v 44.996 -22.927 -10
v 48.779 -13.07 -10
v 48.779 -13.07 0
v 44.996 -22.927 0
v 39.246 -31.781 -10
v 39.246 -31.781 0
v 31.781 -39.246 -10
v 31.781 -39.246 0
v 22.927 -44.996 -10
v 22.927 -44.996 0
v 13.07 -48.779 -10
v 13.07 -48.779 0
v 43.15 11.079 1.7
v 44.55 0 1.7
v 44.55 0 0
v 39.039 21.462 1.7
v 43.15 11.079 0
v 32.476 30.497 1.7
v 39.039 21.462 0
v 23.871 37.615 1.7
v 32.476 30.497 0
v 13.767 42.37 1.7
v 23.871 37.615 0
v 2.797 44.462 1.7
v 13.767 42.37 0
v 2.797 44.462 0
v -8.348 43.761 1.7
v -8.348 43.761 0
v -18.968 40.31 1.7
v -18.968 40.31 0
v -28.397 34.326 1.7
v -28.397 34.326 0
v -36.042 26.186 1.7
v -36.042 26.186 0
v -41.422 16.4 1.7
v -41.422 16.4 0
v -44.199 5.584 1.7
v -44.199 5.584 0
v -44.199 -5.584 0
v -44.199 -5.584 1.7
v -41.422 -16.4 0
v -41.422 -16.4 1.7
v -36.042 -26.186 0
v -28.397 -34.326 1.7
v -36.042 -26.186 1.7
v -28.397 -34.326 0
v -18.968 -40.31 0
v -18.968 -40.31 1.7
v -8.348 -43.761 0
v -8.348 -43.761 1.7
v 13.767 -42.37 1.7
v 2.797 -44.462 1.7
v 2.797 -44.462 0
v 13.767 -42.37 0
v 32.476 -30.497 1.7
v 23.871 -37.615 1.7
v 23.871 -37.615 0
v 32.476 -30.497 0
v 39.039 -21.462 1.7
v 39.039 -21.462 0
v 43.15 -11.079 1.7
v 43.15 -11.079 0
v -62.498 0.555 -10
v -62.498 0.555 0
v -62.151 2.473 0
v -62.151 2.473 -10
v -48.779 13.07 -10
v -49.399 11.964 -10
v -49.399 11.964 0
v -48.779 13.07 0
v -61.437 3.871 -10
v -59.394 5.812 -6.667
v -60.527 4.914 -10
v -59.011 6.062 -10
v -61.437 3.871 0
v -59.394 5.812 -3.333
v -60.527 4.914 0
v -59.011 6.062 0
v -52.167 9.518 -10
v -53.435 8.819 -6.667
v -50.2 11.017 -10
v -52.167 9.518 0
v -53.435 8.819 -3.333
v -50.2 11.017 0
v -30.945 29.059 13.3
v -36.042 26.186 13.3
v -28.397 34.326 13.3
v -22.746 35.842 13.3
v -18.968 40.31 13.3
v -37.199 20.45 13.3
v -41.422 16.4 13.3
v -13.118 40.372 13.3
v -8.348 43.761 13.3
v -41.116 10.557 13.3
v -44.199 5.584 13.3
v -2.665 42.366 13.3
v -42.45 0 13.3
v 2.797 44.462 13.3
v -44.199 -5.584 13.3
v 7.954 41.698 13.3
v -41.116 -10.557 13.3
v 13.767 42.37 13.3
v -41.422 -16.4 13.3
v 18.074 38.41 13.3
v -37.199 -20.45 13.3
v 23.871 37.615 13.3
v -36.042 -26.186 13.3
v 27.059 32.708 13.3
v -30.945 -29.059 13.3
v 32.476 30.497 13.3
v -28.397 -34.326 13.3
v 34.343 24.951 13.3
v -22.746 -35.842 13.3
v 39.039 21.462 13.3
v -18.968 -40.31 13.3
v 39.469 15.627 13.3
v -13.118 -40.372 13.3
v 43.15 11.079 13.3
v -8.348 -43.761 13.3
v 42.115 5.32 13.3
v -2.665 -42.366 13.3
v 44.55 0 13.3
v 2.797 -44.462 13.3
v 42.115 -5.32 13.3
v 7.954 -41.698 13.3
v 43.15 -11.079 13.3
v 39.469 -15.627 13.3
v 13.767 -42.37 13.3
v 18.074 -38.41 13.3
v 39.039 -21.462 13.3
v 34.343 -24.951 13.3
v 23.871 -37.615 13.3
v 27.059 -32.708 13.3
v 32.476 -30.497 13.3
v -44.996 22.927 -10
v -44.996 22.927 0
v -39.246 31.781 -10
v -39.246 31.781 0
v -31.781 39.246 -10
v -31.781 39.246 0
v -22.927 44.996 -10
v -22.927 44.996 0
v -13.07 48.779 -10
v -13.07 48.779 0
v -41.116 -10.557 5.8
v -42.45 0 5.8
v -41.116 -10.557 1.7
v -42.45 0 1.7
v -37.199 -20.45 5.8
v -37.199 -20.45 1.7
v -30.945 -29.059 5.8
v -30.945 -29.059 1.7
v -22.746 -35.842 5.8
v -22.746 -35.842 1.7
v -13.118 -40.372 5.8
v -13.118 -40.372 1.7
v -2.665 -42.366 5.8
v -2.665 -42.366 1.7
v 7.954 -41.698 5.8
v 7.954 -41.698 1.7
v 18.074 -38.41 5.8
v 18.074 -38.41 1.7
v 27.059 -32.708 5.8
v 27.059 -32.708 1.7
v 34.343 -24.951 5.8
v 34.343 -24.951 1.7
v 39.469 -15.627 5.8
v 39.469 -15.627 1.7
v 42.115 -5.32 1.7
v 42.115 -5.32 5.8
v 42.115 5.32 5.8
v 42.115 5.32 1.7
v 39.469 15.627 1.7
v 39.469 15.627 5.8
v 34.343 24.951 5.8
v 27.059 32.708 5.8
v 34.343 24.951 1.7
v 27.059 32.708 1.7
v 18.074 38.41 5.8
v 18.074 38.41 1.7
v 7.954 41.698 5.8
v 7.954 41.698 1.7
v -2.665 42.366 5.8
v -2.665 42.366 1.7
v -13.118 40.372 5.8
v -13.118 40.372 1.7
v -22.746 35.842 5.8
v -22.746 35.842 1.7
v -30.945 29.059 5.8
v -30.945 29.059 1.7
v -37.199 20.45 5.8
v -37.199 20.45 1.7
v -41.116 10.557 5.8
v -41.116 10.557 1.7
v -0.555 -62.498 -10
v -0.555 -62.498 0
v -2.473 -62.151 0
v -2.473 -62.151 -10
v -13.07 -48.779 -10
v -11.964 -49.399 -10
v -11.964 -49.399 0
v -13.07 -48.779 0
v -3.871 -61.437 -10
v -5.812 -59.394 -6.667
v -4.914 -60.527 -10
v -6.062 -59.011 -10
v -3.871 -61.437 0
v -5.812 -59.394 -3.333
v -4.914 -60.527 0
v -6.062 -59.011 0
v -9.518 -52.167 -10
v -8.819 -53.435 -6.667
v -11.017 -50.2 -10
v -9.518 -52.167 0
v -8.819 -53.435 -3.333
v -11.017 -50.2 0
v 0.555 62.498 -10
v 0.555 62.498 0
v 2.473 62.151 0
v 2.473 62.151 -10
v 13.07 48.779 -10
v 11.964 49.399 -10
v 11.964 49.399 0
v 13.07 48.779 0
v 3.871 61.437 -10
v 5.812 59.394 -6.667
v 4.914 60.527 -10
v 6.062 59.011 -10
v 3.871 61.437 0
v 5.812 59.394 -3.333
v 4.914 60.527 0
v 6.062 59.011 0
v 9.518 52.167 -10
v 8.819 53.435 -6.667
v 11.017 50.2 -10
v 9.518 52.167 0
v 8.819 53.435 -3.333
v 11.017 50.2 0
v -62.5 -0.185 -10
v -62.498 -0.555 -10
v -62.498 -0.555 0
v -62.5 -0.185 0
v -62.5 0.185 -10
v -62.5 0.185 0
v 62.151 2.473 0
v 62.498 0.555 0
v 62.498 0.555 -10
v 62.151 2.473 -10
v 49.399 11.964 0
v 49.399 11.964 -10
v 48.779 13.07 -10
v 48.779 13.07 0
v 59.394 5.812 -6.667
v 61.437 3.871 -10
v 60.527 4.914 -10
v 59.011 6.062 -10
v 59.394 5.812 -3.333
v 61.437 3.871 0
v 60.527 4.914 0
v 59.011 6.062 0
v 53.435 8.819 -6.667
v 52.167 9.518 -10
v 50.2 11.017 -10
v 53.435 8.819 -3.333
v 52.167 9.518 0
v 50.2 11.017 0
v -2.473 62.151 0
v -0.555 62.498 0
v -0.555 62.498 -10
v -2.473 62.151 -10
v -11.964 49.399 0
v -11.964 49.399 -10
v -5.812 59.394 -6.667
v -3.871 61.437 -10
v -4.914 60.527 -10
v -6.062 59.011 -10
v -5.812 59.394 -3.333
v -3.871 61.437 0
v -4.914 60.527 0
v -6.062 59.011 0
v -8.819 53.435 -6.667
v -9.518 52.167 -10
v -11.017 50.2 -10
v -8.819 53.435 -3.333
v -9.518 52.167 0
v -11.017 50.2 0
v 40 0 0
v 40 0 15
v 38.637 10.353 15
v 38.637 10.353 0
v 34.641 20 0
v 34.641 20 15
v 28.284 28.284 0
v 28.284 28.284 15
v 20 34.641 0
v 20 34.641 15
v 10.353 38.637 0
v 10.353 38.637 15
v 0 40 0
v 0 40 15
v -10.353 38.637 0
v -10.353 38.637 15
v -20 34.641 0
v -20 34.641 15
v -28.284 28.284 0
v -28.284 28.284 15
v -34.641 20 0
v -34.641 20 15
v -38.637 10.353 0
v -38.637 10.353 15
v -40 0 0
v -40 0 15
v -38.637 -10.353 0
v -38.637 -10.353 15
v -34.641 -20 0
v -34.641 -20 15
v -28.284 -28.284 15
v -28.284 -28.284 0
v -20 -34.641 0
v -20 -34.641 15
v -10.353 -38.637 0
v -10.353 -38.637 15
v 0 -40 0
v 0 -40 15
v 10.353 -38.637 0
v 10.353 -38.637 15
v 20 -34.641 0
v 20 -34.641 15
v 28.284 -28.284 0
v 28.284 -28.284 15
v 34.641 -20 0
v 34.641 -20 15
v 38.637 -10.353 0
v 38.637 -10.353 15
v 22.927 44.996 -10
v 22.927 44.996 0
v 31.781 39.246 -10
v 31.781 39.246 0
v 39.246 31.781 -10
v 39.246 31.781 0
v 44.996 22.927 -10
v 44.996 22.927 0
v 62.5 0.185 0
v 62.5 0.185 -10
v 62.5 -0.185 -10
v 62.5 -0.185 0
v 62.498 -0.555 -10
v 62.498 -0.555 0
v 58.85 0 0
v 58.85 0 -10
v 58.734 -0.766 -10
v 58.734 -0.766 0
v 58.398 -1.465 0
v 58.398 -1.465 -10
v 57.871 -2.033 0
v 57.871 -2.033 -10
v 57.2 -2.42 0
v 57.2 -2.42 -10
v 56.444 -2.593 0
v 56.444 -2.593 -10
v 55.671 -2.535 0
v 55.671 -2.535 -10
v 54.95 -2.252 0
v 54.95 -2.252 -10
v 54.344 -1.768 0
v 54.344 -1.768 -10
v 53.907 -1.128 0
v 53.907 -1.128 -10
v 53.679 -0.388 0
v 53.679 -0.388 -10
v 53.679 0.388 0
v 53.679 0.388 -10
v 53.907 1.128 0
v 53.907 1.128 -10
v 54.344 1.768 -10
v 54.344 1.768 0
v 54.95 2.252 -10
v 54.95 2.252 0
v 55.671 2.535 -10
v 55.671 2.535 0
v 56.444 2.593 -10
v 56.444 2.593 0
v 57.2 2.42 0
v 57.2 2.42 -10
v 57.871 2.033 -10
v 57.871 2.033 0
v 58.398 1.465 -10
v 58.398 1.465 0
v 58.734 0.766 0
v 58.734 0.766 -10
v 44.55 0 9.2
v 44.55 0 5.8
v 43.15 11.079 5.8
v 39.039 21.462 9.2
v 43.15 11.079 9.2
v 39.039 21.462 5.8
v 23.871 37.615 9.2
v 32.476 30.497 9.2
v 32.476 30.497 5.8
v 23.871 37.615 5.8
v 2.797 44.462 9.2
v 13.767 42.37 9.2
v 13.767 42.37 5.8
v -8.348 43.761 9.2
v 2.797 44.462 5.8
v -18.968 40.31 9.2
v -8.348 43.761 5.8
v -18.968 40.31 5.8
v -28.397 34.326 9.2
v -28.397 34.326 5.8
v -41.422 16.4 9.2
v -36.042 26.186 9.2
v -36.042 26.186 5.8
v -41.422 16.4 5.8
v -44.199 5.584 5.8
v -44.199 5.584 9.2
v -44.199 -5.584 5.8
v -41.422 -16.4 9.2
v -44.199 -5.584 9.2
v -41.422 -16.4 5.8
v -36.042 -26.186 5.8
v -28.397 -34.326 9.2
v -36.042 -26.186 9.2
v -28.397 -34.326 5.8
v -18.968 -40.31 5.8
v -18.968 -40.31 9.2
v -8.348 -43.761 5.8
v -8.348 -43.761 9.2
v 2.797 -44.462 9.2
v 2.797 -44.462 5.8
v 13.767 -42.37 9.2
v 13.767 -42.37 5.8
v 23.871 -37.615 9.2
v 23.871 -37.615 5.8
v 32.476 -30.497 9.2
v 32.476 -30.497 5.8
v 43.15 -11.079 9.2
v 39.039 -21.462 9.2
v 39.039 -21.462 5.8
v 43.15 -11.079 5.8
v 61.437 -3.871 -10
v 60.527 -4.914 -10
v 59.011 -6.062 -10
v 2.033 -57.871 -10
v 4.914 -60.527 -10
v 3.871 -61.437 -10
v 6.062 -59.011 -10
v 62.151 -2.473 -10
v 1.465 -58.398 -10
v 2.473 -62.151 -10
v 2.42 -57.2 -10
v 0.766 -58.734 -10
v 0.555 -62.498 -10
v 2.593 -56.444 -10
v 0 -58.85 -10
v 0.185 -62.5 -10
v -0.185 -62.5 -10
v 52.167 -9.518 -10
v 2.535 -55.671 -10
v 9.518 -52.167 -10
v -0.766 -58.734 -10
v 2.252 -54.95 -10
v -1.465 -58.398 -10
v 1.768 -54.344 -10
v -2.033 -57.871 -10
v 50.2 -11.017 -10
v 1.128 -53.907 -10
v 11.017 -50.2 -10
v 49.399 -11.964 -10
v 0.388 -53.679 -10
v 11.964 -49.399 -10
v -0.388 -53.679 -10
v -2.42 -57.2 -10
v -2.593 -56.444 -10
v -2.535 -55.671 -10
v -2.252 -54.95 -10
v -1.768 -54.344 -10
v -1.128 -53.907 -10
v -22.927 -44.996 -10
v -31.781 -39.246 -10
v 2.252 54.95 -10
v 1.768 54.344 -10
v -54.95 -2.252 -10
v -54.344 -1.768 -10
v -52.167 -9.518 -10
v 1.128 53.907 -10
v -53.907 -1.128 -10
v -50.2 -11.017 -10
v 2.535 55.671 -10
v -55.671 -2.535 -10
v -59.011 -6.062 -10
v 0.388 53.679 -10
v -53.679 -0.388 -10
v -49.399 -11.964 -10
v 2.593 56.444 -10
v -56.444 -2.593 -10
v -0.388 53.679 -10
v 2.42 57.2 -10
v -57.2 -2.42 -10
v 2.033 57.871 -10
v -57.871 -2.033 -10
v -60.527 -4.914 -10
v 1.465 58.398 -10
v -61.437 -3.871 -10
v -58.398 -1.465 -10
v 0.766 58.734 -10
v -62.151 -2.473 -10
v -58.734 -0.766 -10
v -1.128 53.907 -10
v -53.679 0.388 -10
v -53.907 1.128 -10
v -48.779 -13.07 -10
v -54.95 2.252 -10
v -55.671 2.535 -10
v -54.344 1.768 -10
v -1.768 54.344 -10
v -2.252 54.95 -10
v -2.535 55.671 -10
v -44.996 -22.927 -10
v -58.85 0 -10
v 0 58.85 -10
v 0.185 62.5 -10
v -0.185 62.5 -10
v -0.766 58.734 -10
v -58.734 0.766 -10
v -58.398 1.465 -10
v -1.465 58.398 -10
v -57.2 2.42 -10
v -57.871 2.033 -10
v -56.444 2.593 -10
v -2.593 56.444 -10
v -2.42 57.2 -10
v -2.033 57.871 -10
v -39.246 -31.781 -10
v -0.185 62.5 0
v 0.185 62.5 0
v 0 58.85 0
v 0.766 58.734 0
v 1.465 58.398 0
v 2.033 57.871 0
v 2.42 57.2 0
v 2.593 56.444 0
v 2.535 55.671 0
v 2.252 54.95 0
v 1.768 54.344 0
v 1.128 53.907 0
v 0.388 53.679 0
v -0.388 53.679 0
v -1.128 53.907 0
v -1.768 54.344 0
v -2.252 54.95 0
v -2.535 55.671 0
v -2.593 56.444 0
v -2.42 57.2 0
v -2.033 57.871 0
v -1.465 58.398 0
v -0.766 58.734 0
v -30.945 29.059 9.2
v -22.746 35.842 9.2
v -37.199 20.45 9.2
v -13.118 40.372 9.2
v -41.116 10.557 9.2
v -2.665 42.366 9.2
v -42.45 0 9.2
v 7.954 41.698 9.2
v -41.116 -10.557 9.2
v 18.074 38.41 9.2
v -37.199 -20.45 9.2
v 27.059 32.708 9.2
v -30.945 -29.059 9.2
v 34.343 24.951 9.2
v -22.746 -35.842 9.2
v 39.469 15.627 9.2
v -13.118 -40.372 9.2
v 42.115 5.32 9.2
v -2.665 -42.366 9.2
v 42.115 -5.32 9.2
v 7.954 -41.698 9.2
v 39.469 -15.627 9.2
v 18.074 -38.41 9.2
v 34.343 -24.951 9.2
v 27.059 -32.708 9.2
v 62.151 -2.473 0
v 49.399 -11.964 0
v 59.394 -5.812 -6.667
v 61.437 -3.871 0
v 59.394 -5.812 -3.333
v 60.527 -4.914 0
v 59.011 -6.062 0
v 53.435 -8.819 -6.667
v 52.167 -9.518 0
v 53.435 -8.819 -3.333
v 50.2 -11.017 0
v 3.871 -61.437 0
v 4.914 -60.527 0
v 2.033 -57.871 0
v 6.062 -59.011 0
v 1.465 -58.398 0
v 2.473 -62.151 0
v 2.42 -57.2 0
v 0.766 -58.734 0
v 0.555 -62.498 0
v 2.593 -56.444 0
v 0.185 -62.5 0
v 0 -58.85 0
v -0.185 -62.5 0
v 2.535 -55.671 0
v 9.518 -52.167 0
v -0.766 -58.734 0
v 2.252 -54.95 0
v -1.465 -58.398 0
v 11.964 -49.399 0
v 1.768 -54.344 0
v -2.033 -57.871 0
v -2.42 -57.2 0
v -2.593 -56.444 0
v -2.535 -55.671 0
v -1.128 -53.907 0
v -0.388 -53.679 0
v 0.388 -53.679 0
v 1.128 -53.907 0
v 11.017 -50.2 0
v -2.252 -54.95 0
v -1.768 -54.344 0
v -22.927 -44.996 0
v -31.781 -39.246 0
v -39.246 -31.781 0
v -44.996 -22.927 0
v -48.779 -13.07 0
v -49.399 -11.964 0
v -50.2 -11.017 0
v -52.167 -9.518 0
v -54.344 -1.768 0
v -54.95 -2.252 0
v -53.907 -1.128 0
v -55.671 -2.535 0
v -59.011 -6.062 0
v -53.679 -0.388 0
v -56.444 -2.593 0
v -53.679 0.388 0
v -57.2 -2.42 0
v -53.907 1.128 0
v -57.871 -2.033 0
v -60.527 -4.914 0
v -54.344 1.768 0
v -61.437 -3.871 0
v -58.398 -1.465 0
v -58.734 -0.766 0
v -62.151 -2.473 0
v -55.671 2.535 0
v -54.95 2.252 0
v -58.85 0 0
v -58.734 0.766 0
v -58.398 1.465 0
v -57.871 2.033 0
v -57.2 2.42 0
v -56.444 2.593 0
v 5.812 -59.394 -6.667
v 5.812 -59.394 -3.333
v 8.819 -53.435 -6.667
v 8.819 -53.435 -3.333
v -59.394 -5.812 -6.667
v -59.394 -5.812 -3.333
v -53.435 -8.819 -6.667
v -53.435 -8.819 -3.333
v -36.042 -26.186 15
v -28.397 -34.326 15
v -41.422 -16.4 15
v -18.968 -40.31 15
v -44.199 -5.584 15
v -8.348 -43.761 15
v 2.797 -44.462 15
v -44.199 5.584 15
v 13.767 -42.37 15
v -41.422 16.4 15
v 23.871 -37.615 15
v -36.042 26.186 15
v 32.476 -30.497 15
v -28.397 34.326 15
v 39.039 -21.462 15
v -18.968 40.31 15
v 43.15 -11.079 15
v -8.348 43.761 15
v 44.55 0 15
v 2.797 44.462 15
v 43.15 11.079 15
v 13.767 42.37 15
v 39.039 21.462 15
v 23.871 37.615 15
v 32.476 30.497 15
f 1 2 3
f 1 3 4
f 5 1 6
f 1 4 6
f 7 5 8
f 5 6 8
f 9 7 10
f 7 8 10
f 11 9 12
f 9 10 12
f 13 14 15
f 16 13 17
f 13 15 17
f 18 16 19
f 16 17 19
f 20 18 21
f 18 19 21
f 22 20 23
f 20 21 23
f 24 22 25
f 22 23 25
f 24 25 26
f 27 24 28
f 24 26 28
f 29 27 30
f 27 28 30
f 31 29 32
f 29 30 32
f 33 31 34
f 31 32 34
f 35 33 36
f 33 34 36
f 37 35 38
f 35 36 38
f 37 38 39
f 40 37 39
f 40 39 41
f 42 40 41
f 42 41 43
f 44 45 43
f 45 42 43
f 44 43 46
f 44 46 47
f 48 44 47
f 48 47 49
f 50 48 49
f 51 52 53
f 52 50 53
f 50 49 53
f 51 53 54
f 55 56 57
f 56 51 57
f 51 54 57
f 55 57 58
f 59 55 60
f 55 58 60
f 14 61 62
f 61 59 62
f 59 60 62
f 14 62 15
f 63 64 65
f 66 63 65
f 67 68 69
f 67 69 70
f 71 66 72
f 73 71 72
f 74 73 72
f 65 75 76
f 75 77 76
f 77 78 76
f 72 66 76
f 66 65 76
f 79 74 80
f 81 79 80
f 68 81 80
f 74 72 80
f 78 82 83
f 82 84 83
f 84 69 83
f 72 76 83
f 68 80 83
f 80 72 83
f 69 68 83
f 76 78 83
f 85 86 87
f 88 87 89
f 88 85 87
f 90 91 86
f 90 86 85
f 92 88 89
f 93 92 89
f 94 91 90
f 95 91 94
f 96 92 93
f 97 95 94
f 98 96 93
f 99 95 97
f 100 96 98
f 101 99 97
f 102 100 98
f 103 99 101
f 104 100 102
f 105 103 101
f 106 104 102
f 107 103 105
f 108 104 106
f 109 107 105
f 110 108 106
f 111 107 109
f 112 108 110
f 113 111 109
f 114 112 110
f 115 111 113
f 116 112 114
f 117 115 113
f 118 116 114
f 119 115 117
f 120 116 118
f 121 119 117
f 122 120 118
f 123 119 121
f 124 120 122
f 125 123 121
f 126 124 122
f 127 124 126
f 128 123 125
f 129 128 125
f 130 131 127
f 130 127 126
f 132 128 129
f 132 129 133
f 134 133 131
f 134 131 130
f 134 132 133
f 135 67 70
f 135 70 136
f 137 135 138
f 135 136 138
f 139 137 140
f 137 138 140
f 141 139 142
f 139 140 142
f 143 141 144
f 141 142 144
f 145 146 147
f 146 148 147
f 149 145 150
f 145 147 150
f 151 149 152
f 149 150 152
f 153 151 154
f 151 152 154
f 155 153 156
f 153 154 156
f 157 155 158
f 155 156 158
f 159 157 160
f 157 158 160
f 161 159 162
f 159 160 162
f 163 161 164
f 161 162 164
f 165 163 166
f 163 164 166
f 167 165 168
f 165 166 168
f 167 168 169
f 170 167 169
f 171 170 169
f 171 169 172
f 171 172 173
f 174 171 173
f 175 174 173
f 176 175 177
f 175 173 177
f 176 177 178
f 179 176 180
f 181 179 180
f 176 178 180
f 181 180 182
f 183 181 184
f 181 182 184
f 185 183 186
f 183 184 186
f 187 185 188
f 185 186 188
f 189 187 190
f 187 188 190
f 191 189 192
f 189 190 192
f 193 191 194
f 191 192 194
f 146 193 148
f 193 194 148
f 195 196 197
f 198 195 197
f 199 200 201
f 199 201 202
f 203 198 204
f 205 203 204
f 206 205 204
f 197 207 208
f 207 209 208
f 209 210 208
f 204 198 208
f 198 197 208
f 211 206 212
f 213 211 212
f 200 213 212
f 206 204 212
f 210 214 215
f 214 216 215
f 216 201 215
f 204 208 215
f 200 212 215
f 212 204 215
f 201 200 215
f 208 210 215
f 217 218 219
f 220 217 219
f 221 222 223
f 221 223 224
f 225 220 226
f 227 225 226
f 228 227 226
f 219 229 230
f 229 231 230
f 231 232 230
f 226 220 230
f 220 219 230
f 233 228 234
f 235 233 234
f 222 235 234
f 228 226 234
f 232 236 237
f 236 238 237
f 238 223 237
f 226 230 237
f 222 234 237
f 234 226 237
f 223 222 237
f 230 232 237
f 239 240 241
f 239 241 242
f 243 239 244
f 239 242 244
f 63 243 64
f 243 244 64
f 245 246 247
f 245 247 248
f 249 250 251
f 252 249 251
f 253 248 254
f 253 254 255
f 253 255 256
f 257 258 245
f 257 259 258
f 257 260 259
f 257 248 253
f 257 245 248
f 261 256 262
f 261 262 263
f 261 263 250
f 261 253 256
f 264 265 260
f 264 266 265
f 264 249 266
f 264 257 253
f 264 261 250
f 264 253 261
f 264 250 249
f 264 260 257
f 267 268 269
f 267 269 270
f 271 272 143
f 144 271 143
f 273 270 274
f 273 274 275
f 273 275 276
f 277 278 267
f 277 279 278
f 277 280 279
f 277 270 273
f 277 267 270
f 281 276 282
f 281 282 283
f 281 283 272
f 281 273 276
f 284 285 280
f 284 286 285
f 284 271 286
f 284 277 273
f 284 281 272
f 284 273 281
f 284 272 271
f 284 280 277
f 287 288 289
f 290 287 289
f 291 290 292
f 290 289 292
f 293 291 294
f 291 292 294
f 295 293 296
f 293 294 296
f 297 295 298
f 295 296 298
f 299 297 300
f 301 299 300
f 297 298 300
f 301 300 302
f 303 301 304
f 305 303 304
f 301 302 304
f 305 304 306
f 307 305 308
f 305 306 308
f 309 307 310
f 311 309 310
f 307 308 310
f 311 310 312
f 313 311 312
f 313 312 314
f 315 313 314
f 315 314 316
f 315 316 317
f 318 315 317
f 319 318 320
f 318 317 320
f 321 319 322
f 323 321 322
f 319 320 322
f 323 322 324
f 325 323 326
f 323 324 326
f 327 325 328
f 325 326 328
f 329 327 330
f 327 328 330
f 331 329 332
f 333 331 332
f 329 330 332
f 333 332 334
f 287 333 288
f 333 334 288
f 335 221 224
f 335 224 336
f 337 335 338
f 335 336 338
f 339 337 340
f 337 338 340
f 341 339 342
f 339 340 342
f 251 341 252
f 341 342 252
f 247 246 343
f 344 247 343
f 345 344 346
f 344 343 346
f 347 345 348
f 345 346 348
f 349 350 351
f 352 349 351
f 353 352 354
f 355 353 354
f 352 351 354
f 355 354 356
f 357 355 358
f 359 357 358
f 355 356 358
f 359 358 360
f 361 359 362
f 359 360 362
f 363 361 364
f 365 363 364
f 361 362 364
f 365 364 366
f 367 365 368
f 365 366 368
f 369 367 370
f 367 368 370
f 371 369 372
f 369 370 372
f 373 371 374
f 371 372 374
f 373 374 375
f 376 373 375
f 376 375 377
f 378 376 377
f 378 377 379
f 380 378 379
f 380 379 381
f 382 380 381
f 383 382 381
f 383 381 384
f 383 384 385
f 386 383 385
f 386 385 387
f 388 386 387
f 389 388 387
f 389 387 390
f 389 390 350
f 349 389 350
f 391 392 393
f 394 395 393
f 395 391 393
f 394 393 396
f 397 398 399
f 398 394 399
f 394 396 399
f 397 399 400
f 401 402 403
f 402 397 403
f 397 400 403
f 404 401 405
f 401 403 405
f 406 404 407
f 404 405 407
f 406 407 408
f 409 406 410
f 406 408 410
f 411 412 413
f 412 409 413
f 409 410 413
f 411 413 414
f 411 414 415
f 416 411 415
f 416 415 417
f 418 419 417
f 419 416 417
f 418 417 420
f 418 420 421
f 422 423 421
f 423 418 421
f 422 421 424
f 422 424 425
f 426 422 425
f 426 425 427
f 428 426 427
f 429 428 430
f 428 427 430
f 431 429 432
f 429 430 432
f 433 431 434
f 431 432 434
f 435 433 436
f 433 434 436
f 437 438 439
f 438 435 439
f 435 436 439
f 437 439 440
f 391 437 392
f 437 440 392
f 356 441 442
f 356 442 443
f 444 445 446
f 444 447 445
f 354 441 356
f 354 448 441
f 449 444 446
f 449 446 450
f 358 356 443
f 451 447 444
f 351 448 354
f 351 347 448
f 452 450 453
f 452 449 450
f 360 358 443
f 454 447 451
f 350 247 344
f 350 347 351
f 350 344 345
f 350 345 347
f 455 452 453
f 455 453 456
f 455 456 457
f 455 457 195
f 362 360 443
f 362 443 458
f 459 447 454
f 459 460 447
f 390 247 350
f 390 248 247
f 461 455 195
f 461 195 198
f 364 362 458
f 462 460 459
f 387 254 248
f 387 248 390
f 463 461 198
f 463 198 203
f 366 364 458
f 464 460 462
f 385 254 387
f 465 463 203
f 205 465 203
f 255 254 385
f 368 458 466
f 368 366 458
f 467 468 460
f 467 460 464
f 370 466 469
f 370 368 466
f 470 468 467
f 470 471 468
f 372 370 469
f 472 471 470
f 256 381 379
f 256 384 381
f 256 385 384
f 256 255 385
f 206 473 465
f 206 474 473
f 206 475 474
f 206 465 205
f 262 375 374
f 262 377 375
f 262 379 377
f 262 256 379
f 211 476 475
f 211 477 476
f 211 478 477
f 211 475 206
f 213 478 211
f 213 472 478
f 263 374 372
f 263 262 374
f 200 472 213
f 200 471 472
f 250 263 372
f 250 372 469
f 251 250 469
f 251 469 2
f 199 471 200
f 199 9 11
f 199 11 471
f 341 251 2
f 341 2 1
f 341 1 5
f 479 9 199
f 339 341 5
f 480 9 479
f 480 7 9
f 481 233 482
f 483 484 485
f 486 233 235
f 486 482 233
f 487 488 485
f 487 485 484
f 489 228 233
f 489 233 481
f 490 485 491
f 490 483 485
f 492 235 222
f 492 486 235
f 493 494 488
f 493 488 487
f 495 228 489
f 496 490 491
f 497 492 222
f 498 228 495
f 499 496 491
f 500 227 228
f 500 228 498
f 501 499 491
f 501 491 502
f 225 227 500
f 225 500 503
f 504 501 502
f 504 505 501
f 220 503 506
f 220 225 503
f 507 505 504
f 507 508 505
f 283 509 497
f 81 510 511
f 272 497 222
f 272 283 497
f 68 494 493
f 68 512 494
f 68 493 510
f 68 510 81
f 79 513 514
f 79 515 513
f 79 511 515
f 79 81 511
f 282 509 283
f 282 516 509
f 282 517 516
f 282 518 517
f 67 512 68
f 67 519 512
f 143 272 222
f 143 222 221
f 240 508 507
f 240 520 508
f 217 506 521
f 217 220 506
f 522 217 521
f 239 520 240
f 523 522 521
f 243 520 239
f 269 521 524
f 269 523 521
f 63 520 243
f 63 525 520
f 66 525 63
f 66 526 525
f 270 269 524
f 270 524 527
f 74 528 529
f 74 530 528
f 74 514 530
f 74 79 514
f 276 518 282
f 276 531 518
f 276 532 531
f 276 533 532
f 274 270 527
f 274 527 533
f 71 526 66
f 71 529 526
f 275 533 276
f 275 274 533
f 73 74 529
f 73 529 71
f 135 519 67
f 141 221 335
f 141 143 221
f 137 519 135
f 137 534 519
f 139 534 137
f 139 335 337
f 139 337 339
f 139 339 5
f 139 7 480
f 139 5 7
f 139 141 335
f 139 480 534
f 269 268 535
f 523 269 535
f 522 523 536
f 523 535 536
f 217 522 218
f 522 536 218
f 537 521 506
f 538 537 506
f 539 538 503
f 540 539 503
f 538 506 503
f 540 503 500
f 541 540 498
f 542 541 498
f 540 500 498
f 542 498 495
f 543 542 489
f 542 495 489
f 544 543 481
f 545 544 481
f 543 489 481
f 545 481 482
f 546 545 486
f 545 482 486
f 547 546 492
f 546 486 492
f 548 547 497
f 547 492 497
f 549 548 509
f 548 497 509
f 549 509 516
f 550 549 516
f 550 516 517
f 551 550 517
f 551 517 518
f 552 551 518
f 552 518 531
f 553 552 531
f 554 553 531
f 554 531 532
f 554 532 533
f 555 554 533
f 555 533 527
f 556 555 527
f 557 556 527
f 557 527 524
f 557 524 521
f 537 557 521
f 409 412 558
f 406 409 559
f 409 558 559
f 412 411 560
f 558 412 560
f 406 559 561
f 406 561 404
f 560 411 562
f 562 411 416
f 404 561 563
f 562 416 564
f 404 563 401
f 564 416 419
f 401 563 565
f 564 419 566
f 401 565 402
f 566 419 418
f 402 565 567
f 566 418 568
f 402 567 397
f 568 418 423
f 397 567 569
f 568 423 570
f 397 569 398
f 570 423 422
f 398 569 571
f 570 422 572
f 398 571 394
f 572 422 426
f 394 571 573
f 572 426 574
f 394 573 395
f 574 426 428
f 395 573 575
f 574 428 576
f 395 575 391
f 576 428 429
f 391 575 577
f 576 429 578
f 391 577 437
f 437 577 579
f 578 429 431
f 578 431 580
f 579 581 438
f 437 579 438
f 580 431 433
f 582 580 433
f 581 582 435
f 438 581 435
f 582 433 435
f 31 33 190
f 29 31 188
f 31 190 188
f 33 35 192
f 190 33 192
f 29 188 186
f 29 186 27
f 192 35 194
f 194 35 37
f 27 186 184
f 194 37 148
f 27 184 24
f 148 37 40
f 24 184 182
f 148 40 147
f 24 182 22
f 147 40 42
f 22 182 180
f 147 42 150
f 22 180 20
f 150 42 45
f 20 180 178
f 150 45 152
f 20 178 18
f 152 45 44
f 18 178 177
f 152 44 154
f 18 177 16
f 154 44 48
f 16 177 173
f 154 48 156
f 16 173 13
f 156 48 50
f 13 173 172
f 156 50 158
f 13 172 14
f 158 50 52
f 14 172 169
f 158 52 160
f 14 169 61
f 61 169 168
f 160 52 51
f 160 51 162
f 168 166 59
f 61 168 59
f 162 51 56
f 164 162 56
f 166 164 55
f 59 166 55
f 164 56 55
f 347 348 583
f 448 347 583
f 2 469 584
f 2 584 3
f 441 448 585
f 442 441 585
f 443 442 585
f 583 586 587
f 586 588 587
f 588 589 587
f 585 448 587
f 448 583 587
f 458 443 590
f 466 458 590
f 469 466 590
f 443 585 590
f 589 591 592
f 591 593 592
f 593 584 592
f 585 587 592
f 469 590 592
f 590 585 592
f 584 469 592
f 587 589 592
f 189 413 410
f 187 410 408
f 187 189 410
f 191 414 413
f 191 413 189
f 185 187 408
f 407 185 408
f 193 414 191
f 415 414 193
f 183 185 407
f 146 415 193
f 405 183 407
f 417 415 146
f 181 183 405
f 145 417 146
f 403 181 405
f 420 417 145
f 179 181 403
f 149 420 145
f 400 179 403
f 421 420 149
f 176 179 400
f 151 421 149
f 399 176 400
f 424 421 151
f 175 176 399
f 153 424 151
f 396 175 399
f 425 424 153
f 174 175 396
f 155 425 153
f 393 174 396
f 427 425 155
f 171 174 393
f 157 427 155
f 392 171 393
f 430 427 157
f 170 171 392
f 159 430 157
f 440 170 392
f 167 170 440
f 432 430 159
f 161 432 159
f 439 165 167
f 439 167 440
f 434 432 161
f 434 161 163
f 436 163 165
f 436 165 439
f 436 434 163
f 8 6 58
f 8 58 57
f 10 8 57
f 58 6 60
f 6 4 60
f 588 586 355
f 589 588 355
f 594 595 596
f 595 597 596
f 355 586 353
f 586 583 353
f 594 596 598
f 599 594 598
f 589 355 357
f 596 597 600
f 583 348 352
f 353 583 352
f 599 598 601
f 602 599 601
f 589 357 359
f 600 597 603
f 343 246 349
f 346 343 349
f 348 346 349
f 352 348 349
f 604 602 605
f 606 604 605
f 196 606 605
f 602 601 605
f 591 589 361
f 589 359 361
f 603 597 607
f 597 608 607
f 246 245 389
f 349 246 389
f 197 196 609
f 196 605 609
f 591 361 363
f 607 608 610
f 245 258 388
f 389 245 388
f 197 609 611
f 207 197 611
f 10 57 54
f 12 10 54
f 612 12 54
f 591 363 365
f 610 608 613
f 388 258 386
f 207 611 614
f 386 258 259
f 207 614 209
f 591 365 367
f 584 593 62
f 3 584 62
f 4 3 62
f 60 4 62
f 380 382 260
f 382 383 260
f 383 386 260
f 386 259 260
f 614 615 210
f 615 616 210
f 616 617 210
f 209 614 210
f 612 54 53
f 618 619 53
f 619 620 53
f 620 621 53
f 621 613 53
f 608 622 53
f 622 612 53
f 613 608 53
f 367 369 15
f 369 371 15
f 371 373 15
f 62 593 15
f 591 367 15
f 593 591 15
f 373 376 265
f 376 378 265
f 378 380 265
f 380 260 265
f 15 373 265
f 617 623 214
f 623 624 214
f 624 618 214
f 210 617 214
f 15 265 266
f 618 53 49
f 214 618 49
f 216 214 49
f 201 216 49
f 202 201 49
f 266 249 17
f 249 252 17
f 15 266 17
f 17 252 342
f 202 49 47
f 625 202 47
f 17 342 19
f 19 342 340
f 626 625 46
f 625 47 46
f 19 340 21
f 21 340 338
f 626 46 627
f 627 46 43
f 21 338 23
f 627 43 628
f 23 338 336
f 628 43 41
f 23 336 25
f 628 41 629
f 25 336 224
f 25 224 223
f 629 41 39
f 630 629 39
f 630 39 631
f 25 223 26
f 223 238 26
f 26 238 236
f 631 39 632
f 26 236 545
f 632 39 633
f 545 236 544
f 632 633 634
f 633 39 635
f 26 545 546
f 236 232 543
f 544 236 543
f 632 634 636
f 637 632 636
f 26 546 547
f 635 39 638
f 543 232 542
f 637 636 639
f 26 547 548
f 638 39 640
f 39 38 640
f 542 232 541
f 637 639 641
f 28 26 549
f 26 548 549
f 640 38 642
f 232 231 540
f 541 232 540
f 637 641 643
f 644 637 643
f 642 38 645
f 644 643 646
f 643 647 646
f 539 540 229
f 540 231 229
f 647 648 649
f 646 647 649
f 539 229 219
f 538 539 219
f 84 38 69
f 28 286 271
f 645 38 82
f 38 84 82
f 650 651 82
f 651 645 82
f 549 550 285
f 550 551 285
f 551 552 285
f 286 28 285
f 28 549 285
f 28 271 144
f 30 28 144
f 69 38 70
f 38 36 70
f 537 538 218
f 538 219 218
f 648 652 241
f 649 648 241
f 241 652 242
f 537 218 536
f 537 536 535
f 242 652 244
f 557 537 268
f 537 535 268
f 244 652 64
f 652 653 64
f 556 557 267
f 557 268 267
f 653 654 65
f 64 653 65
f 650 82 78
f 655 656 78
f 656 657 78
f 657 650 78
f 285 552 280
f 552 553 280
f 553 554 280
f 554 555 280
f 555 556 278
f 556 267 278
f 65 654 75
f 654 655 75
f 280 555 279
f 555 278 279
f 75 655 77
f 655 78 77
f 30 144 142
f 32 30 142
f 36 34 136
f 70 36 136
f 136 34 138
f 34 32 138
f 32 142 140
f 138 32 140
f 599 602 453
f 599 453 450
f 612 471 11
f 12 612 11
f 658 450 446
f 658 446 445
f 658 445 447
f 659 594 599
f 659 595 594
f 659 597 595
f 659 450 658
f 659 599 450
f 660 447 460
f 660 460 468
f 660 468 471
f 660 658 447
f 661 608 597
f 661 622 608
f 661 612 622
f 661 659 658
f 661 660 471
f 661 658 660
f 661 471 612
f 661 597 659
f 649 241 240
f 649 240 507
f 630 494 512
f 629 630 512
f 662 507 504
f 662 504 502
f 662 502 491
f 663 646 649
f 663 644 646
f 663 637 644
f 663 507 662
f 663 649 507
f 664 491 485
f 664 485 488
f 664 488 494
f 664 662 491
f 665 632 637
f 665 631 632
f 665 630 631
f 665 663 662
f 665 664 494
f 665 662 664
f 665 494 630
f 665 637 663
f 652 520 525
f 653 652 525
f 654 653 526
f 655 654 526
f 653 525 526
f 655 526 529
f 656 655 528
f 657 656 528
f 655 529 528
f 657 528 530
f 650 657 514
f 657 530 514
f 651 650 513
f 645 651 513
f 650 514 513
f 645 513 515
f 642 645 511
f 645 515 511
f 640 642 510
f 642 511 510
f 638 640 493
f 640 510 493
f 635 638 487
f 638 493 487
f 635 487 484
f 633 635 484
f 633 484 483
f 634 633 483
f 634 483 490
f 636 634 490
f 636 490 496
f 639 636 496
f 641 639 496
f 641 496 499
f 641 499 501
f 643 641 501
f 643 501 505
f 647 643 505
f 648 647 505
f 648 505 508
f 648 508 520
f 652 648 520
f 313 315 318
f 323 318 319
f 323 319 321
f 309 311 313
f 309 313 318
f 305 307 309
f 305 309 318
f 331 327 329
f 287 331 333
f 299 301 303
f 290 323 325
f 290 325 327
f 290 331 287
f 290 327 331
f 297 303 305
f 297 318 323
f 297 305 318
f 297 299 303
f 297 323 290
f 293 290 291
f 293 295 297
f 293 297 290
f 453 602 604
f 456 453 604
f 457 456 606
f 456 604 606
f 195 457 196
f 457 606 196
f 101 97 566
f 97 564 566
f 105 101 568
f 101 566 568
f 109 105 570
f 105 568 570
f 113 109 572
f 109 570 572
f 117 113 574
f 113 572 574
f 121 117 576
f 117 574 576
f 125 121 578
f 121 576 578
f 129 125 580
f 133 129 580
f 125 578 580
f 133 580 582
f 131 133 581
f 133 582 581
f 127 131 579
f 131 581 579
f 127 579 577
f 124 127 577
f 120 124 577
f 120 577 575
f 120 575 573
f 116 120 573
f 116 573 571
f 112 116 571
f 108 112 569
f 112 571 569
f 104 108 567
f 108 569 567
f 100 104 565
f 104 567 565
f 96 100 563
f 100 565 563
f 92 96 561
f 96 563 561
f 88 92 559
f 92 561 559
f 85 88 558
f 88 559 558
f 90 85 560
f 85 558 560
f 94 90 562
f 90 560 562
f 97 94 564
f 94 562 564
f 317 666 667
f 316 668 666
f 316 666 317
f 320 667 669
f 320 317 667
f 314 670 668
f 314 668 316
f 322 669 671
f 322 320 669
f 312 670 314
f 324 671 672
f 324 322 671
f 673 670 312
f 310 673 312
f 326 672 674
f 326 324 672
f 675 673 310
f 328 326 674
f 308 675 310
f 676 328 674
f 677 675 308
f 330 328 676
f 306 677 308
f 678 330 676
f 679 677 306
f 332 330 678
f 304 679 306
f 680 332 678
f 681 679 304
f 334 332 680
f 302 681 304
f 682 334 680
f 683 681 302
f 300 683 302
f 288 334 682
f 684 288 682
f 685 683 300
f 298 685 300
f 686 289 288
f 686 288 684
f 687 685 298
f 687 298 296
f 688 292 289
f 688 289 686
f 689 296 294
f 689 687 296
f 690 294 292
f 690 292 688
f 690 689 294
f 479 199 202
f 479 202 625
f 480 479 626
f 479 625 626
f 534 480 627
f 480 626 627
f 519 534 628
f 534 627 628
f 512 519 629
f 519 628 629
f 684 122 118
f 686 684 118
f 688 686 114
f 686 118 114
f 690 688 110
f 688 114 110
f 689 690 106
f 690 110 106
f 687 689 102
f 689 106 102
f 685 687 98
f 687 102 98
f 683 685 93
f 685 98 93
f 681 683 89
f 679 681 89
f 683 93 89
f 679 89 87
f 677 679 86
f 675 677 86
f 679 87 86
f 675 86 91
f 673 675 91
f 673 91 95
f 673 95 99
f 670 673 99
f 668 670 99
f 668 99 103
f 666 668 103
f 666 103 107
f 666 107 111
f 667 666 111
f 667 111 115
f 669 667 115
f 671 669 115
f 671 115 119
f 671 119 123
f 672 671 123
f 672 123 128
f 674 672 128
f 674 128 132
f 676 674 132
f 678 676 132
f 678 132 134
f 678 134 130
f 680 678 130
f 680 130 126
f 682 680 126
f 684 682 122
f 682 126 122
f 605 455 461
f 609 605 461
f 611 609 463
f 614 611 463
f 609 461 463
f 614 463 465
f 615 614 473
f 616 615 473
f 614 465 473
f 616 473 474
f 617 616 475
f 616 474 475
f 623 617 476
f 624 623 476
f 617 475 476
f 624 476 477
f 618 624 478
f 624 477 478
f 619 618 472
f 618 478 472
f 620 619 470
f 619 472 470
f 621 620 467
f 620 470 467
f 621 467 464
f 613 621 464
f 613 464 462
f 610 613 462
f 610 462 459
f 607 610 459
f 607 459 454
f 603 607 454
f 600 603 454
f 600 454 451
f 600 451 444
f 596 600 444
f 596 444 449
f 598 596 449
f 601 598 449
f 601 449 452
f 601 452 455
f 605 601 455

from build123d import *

# Parameters (mm, degrees)
SKETCH1_R           = 44.55
BOSS_EXTRUDE1_DEPTH = 15
SKETCH2_R           = 62.5
BOSS_EXTRUDE2_DEPTH = 10
SKETCH3_R           = 40
CUT_EXTRUDE1_DEPTH  = 15
SKETCH4_W           = 4.1
SKETCH4_H           = 2.1
SKETCH7_R           = 2.6
CUT_EXTRUDE4_DEPTH  = 92.855865354
CIRPATTERN1_COUNT   = 4
CUT_EXTRUDE6_DEPTH  = 10


with BuildPart() as part:
    # Sketch1 → Boss-Extrude1 (new body)
    with BuildSketch(Plane.XY):
        Circle(SKETCH1_R)
    extrude(amount=BOSS_EXTRUDE1_DEPTH)

    # Sketch2 → Boss-Extrude2 (add)
    with BuildSketch(Plane(origin=(0, 0, 0), x_dir=(-1, 0, 0), z_dir=(0, 0, -1))):
        Circle(SKETCH2_R)
    extrude(amount=BOSS_EXTRUDE2_DEPTH)

    # Sketch3 → Cut-Extrude1 (cut)
    with BuildSketch(Plane.XY.offset(15)):
        Circle(SKETCH3_R)
    extrude(amount=-CUT_EXTRUDE1_DEPTH, mode=Mode.SUBTRACT)

    # Sketch4 → Cut-Revolve1 (revolve, cut)
    with BuildSketch(Plane(origin=(0, 0, 0), x_dir=(0, 0, -1), z_dir=(1, 0, 0))):
        with Locations((-3.75, 43.5)):
            Rectangle(SKETCH4_W, SKETCH4_H)
        with Locations((-11.25, 43.5)):
            Rectangle(SKETCH4_W, SKETCH4_H)
    revolve(axis=Axis((0, 0, -42.713110189), (0, 0, 1)), mode=Mode.SUBTRACT)

    # Sketch7 → Cut-Extrude4 (cut, through all)
    with BuildSketch(Plane(origin=(0, 0, -10), x_dir=(-1, 0, 0), z_dir=(0, 0, -1))):
        with Locations((56.25, 0)):
            Circle(SKETCH7_R)
    cut_extrude4 = extrude(amount=-CUT_EXTRUDE4_DEPTH, mode=Mode.SUBTRACT)

    # CirPattern1: Cut-Extrude4 ×4 about axis
    cirpattern1_axis = Axis((0, 0, -45.874761596), (0, 0, 1))
    for i in range(1, CIRPATTERN1_COUNT):
        add(cut_extrude4.rotate(cirpattern1_axis, i * 360 / CIRPATTERN1_COUNT), mode=Mode.SUBTRACT)

    # Sketch10 → Cut-Extrude6 (cut)
    with BuildSketch(Plane.XY):
        with BuildLine():
            ThreePointArc((13.070361778, 48.779254228), (35.70889245, 35.70889245), (48.779254228, 13.070361778))
            add(Edge.make_bspline(
                [(62.4975392, 0.55461157), (62.208727423, 8.100511472), (51.397803822, 7.033582927), (48.779254228, 13.070361778)],
                knots=[0.023286113, 0.023286113, 0.023286113, 0.023286113, 1, 1, 1, 1], degree=3))
            ThreePointArc((62.4975392, 0.55461157), (44.194173824, 44.194173824), (0.55461157, 62.4975392))
            add(Edge.make_bspline(
                [(0.55461157, 62.4975392), (8.100511472, 62.208727423), (7.033582927, 51.397803822), (13.070361778, 48.779254228)],
                knots=[0.023286113, 0.023286113, 0.023286113, 0.023286113, 1, 1, 1, 1], degree=3))
        make_face()
        with BuildLine():
            add(Edge.make_bspline(
                [(62.4975392, -0.55461157), (62.208727423, -8.100511472), (51.397803822, -7.033582927), (48.779254228, -13.070361778)],
                knots=[0.023286113, 0.023286113, 0.023286113, 0.023286113, 1, 1, 1, 1], degree=3))
            ThreePointArc((48.779254228, -13.070361778), (35.70889245, -35.70889245), (13.070361778, -48.779254228))
            add(Edge.make_bspline(
                [(0.55461157, -62.4975392), (8.100511472, -62.208727423), (7.033582927, -51.397803822), (13.070361778, -48.779254228)],
                knots=[0.023286113, 0.023286113, 0.023286113, 0.023286113, 1, 1, 1, 1], degree=3))
            ThreePointArc((0.55461157, -62.4975392), (44.194173824, -44.194173824), (62.4975392, -0.55461157))
        make_face()
        with BuildLine():
            ThreePointArc((-48.779254228, 13.070361778), (-35.70889245, 35.70889245), (-13.070361778, 48.779254228))
            add(Edge.make_bspline(
                [(-0.55461157, 62.4975392), (-8.100511472, 62.208727423), (-7.033582927, 51.397803822), (-13.070361778, 48.779254228)],
                knots=[0.023286113, 0.023286113, 0.023286113, 0.023286113, 1, 1, 1, 1], degree=3))
            ThreePointArc((-0.55461157, 62.4975392), (-44.194173824, 44.194173824), (-62.4975392, 0.55461157))
            add(Edge.make_bspline(
                [(-62.4975392, 0.55461157), (-62.208727423, 8.100511472), (-51.397803822, 7.033582927), (-48.779254228, 13.070361778)],
                knots=[0.023286113, 0.023286113, 0.023286113, 0.023286113, 1, 1, 1, 1], degree=3))
        make_face()
        with BuildLine():
            add(Edge.make_bspline(
                [(-0.55461157, -62.4975392), (-8.100511472, -62.208727423), (-7.033582927, -51.397803822), (-13.070361778, -48.779254228)],
                knots=[0.023286113, 0.023286113, 0.023286113, 0.023286113, 1, 1, 1, 1], degree=3))
            ThreePointArc((-13.070361778, -48.779254228), (-35.70889245, -35.70889245), (-48.779254228, -13.070361778))
            add(Edge.make_bspline(
                [(-62.4975392, -0.55461157), (-62.208727423, -8.100511472), (-51.397803822, -7.033582927), (-48.779254228, -13.070361778)],
                knots=[0.023286113, 0.023286113, 0.023286113, 0.023286113, 1, 1, 1, 1], degree=3))
            ThreePointArc((-62.4975392, -0.55461157), (-44.194173824, -44.194173824), (-0.55461157, -62.4975392))
        make_face()
    extrude(amount=-CUT_EXTRUDE6_DEPTH, mode=Mode.SUBTRACT)


solid = part.part
